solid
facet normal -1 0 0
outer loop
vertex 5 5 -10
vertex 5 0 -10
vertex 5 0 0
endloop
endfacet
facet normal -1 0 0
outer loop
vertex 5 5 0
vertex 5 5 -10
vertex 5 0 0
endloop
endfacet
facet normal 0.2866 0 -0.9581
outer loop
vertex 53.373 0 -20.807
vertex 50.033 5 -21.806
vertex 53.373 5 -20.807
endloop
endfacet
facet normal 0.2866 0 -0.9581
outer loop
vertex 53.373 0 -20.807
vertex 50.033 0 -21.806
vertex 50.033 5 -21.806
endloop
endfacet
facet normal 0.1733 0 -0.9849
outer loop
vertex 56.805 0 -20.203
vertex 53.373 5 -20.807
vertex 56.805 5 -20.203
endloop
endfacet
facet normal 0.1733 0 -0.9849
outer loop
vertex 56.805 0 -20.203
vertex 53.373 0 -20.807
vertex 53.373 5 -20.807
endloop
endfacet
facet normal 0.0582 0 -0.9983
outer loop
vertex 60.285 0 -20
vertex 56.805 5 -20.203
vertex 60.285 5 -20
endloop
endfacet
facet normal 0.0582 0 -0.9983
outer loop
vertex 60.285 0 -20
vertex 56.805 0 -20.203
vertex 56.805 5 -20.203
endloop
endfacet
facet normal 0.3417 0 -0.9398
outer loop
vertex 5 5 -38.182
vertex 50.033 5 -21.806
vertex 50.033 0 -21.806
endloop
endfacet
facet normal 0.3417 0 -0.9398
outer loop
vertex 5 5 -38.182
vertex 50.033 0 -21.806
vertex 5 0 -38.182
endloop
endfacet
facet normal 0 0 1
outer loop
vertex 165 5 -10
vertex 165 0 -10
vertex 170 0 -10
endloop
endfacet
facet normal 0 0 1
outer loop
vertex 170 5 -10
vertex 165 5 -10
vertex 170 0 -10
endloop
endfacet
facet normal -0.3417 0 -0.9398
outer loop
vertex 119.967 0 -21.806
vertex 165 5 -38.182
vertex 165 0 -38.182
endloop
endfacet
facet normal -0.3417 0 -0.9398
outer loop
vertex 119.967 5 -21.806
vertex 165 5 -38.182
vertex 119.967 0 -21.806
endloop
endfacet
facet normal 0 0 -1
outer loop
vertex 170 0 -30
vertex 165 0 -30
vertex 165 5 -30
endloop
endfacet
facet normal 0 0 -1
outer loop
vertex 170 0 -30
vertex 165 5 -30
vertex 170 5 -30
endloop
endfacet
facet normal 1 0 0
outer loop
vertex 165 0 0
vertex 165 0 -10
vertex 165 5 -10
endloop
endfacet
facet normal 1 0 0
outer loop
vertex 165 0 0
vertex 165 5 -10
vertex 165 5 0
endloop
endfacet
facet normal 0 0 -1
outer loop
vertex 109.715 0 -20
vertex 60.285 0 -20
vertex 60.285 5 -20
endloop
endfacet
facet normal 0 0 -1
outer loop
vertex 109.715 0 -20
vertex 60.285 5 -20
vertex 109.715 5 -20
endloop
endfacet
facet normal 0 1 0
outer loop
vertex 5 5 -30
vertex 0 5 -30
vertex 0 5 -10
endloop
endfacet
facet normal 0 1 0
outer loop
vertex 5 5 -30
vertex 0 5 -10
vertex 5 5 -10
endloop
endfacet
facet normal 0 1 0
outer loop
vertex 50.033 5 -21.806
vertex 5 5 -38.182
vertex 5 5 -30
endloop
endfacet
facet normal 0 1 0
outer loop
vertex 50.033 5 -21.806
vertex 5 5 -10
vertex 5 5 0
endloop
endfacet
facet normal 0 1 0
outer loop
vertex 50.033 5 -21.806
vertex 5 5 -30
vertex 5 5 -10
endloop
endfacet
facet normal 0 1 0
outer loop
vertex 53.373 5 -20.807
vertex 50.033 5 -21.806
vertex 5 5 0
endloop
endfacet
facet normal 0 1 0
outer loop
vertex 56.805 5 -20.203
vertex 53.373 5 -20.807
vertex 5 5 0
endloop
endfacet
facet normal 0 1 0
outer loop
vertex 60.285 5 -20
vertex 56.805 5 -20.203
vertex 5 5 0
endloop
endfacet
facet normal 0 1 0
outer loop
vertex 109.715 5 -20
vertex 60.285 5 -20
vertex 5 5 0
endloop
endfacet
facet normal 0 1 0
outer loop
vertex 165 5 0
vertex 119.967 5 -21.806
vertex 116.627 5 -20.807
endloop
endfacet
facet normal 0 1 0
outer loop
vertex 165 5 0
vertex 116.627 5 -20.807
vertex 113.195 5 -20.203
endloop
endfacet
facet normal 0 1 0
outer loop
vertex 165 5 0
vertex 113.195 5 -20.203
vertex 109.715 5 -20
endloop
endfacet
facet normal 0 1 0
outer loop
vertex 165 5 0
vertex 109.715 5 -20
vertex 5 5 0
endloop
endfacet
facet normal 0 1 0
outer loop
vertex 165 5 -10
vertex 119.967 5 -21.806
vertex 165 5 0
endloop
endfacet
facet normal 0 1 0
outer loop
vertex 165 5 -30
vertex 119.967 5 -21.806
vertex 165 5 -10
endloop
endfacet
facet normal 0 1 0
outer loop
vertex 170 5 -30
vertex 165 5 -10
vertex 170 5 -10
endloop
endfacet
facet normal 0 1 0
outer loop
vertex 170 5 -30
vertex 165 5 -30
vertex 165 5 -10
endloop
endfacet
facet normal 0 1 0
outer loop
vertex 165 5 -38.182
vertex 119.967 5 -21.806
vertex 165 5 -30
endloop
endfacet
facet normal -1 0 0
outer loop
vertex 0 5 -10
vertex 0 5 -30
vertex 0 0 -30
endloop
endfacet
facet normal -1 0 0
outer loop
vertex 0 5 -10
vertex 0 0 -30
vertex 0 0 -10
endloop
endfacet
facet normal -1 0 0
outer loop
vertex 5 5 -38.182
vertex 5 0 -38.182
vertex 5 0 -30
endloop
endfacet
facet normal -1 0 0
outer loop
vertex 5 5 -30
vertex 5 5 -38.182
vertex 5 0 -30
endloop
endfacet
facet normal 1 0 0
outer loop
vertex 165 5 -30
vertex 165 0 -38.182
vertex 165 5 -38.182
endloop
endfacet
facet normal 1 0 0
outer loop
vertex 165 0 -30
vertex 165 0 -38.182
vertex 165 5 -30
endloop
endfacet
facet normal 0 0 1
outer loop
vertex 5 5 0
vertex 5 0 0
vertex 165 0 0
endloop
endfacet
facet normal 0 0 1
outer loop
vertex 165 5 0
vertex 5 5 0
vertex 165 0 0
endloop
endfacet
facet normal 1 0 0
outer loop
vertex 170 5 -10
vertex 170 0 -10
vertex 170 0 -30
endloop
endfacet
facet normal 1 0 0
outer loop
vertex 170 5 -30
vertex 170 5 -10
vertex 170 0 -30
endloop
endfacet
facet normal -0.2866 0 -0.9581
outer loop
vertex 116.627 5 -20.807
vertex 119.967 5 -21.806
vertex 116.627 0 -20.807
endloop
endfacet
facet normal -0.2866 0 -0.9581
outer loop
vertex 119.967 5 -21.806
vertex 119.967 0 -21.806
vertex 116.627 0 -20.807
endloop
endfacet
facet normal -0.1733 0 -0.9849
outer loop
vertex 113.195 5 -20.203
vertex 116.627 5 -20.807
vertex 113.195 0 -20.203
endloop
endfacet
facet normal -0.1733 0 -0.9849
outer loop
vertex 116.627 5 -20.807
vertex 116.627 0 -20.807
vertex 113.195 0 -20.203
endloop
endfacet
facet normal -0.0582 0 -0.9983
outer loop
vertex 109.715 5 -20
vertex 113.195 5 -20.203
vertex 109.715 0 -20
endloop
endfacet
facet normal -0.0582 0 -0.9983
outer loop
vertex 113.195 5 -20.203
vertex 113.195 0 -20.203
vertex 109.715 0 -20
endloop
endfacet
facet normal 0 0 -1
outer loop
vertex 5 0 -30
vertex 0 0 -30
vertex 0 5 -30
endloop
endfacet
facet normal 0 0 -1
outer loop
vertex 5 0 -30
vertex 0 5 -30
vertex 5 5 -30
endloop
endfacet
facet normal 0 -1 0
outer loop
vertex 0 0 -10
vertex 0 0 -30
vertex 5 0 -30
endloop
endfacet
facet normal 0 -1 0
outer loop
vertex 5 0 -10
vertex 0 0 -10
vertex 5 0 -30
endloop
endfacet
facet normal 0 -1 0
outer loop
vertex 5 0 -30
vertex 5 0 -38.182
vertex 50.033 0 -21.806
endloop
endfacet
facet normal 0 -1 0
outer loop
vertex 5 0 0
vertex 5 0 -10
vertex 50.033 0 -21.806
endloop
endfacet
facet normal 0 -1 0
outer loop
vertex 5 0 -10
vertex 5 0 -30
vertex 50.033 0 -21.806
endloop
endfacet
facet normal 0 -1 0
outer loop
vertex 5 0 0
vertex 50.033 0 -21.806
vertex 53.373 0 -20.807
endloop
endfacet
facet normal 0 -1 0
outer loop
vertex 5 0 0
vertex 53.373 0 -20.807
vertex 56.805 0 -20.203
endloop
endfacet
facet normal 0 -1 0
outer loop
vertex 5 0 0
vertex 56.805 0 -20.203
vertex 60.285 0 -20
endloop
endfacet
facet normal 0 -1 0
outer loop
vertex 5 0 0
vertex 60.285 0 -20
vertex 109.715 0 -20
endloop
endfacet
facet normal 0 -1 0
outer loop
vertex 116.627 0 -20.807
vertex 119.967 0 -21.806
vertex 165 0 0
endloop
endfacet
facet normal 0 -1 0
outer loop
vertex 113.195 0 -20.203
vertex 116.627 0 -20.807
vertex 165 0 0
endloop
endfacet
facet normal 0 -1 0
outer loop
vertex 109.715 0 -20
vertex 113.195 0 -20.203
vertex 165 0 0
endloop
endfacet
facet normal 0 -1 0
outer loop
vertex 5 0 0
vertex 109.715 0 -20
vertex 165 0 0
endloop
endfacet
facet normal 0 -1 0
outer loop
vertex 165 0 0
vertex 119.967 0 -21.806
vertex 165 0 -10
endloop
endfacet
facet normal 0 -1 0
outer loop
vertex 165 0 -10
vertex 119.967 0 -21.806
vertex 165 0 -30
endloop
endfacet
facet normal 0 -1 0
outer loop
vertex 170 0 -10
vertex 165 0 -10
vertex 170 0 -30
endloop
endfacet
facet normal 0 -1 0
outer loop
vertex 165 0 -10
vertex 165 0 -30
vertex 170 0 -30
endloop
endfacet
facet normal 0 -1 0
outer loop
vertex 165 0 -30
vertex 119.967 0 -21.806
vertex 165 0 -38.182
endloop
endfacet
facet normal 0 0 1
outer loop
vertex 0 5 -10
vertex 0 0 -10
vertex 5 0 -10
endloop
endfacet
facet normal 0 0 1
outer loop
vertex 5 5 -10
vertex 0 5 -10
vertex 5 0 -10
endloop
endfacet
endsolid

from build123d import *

# Parameters (mm, degrees)
SKETCH_1_W          = 170
SKETCH_1_H          = 20
EXTRUDE_1_DEPTH     = 5
EXTRUDE_2_DEPTH     = 5
FILLET_1_R          = 30
SKETCH_3_W          = 5
SKETCH_3_H          = 10
CUT_EXTRUDE_1_DEPTH = 10


with BuildPart() as part:
    # 스케치1 → 보스-돌출1 (new body)
    with BuildSketch(Plane(origin=(0, 0, 0), x_dir=(1, 0, 0), z_dir=(0, 1, 0))):
        with Locations((85, 10)):
            Rectangle(SKETCH_1_W, SKETCH_1_H)
    extrude(amount=EXTRUDE_1_DEPTH)

    # 스케치2 → 보스-돌출2 (add)
    with BuildSketch(Plane(origin=(0, 5, 0), x_dir=(1, 0, 0), z_dir=(0, 1, 0))):
        Polygon((0, 20), (55, 20), (0, 40), align=None)
        Polygon((115, 20), (170, 20), (170, 40), align=None)
    extrude(amount=-EXTRUDE_2_DEPTH)

    # 필렛1
    fillet_1_edges = [part.edges().sort_by_distance(p)[0] for p in [
        (55, 2.5, -20),
        (115, 2.5, -20),
    ]]
    fillet(fillet_1_edges, radius=FILLET_1_R)

    # 스케치3 → 컷-돌출1 (cut)
    with BuildSketch(Plane.XZ):
        with Locations((167.5, -5)):
            Rectangle(SKETCH_3_W, SKETCH_3_H)
        with Locations((167.5, -35)):
            Rectangle(SKETCH_3_W, SKETCH_3_H)
        with Locations((2.5, -35)):
            Rectangle(SKETCH_3_W, SKETCH_3_H)
        with Locations((2.5, -5)):
            Rectangle(SKETCH_3_W, SKETCH_3_H)
    extrude(amount=-CUT_EXTRUDE_1_DEPTH, mode=Mode.SUBTRACT)


solid = part.part
